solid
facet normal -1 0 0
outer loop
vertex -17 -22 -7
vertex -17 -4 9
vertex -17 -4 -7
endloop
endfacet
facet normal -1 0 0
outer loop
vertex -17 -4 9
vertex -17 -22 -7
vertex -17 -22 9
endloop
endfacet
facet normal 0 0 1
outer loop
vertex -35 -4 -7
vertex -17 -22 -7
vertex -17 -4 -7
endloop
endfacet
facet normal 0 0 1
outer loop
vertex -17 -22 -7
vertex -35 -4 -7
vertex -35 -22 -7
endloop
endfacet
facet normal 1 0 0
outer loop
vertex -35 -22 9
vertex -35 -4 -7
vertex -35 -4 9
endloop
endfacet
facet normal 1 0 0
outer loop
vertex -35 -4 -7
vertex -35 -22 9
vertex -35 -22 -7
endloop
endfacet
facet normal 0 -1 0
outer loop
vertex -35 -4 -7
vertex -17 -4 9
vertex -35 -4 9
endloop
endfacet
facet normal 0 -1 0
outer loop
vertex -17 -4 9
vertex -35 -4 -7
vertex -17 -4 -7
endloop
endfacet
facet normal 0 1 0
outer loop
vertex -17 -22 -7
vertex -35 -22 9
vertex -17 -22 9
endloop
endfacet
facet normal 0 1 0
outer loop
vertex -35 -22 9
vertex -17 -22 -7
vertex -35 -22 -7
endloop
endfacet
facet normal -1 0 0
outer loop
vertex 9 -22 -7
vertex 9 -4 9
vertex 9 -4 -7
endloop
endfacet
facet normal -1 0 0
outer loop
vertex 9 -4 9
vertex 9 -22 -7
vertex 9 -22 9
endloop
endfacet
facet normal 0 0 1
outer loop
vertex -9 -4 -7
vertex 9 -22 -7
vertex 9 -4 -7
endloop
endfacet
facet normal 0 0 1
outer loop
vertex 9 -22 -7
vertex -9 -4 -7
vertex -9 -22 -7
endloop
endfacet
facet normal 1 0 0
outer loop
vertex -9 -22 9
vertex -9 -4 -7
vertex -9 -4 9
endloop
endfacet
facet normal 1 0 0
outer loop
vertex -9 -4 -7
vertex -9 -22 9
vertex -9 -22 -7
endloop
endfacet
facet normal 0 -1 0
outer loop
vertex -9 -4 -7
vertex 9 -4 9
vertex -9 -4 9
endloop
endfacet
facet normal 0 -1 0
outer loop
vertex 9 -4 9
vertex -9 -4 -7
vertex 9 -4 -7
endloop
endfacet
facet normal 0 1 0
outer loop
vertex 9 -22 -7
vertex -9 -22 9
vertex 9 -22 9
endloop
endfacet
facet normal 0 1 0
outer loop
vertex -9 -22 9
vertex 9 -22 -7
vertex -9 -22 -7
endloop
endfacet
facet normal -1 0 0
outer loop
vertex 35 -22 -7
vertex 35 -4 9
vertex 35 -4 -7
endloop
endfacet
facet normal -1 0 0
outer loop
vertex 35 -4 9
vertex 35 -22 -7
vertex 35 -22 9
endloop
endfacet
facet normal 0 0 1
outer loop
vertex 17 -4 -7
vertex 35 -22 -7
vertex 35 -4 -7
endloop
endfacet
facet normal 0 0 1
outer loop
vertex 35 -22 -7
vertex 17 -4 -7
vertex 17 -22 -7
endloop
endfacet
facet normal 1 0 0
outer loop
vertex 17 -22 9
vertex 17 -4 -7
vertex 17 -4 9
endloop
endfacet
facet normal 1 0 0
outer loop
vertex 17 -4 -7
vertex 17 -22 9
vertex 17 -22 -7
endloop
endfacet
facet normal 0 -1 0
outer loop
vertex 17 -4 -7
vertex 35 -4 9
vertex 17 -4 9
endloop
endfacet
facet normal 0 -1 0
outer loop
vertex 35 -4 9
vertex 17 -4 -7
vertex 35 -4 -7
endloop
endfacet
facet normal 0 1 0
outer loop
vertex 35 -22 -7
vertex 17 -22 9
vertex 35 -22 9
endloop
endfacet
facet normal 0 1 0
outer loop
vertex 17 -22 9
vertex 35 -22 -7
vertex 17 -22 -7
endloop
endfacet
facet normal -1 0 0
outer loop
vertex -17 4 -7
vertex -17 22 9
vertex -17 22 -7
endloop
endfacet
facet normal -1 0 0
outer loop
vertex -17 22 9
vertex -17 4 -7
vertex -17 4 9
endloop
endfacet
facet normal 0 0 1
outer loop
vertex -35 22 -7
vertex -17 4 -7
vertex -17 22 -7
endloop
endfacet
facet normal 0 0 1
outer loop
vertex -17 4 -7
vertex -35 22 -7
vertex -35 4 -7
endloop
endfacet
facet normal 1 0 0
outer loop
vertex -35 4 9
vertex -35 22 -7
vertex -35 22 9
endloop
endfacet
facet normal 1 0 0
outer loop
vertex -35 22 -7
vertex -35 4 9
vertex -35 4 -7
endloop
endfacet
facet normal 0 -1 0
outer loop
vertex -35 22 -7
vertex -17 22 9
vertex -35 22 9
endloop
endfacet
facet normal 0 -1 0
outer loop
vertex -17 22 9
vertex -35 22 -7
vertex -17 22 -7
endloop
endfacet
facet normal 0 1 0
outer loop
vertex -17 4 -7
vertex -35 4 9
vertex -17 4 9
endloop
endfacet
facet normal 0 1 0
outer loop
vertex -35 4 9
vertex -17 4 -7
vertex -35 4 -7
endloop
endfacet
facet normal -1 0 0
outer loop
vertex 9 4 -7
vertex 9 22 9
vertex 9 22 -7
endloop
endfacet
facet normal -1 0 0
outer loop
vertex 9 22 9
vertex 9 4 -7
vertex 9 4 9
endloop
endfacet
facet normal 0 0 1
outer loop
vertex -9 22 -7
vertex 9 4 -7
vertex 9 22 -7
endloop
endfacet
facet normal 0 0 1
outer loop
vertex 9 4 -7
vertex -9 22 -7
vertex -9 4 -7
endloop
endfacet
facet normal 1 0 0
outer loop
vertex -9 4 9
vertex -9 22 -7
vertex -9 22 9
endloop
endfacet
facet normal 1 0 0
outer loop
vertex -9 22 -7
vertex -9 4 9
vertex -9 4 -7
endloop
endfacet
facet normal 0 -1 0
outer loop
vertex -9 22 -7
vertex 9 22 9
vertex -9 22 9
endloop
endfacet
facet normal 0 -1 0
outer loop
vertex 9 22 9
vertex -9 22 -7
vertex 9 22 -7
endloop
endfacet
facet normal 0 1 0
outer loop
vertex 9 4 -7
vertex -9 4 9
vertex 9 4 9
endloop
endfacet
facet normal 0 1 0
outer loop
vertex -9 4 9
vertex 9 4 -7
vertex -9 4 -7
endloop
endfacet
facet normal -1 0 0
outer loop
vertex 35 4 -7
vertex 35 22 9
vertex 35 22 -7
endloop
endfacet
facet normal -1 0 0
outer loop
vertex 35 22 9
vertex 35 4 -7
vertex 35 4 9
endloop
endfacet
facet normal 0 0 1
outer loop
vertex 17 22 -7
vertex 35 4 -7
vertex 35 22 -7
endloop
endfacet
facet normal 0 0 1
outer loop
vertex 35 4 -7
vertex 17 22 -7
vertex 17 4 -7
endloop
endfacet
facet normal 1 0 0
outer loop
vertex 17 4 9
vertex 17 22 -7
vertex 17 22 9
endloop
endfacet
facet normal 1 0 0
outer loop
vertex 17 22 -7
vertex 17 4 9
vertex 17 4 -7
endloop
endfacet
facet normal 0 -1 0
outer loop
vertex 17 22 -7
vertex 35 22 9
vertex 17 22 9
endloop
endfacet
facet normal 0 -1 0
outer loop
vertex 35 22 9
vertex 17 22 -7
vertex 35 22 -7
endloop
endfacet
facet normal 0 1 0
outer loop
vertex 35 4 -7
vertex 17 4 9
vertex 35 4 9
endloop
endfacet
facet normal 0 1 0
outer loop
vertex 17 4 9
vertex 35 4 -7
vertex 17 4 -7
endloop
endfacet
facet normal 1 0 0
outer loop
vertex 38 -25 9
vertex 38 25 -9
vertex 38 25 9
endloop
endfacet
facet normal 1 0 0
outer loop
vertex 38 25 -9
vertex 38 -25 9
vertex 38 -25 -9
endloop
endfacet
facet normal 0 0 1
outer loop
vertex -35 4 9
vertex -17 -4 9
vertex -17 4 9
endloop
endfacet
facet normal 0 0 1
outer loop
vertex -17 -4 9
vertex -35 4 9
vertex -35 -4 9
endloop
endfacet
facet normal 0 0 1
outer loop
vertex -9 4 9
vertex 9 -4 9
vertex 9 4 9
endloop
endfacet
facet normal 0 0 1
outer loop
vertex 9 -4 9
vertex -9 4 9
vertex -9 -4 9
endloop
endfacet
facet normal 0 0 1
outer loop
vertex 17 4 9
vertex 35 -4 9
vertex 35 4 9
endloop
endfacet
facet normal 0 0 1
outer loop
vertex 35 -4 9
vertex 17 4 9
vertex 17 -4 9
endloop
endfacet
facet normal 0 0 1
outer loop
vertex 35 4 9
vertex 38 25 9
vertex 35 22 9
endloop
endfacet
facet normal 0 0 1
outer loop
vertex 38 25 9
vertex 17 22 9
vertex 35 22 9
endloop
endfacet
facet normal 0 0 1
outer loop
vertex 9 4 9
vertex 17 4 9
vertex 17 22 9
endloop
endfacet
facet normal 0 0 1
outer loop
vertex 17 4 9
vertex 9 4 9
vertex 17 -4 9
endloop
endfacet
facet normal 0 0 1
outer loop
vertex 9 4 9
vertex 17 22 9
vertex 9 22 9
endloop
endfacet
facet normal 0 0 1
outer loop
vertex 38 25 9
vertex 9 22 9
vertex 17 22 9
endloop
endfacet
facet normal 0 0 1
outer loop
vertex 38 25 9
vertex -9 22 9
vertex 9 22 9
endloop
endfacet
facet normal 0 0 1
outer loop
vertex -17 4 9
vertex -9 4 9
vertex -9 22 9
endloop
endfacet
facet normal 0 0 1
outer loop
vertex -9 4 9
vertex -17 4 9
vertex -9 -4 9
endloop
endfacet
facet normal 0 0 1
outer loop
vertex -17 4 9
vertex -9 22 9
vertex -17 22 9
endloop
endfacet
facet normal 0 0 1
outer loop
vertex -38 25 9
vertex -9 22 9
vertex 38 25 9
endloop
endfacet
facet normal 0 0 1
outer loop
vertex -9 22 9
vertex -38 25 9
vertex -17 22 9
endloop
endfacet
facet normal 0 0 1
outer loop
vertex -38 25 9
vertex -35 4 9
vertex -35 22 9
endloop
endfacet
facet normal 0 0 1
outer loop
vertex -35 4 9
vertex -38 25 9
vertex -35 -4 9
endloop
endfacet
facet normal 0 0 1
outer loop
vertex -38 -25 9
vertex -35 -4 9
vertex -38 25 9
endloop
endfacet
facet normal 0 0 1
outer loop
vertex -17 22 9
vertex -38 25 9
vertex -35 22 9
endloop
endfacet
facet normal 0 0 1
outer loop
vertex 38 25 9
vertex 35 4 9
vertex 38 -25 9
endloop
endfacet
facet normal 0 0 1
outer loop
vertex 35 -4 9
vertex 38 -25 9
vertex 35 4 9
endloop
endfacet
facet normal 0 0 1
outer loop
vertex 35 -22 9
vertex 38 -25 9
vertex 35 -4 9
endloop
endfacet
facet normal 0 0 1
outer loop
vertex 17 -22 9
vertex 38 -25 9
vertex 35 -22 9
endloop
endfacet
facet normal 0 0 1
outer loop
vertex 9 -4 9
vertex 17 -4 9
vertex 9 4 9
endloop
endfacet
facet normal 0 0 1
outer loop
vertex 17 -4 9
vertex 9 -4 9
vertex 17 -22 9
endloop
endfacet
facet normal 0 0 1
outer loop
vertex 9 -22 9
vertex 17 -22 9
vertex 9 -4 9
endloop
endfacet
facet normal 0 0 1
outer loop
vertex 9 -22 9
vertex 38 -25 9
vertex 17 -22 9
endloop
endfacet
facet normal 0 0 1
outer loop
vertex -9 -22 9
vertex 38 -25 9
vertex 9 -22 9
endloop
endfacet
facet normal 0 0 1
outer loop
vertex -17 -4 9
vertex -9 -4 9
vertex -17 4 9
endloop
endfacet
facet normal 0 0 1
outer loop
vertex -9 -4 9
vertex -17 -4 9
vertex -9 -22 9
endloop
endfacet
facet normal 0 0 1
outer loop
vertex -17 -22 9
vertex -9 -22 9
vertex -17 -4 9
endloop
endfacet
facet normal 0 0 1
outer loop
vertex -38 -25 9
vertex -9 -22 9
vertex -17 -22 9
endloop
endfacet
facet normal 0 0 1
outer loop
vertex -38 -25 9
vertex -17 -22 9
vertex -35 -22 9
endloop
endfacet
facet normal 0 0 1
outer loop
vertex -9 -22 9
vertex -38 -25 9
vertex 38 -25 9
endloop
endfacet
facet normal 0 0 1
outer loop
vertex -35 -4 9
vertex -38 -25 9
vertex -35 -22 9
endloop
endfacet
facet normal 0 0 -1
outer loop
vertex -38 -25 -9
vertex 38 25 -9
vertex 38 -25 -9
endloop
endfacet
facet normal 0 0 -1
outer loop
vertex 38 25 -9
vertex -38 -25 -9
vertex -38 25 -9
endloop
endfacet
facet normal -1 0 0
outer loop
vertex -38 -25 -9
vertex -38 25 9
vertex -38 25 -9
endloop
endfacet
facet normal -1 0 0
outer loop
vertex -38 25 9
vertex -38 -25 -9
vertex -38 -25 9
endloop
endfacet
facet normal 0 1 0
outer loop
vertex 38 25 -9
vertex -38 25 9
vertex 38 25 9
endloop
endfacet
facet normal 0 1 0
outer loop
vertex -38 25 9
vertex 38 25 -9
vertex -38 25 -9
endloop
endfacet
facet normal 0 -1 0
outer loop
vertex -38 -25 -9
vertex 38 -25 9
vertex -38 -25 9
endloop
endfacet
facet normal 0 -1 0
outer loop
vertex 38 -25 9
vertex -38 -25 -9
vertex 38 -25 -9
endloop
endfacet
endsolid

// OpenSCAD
$fn = 32;

// ----------------------------------------------------------------------
// Pocket plate 76 x 50 x 18
// 2 x 3 pockets 18 mm square, 16 mm deep
// ----------------------------------------------------------------------

// --- parameters (mm) ---
thickness = 18;  // plate thickness
floor_t = 2;     // material left under each pocket
pocket = 18;     // pocket side length
pitch_x = 26;    // pocket pitch along X
pitch_y = 26;    // pocket pitch along Y
cols = 3;        // pockets per row
rows = 2;        // rows of pockets

// --- derived feature positions (mm) ---
depth = thickness - floor_t;        // = 16   pocket depth, down to the floor
span_x = (cols - 1) * pitch_x;      // = 52   distance between outer pockets
span_y = (rows - 1) * pitch_y;      // = 26   distance between outer pocket rows
origin_x = -span_x / 2;             // = -26   X of the first pocket
origin_y = -span_y / 2;             // = -13   Y of the first pocket
plate = [span_x + pocket + 6, span_y + pocket + 6, thickness];  // = [76, 50, 18]   overall size: pockets plus 3 mm of wall on each side
feature_centers = [
  [origin_x + 0 * pitch_x, origin_y + 0 * pitch_y],
  [origin_x + 1 * pitch_x, origin_y + 0 * pitch_y],
  [origin_x + 2 * pitch_x, origin_y + 0 * pitch_y],
  [origin_x + 0 * pitch_x, origin_y + 1 * pitch_y],
  [origin_x + 1 * pitch_x, origin_y + 1 * pitch_y],
  [origin_x + 2 * pitch_x, origin_y + 1 * pitch_y]
];   // pocket centres, used verbatim by the cutter loop

// plate outline, then one pocket per centre in feature_centers
difference() {
  cube(plate, center = true);
  for (centre = feature_centers)
    translate([centre[0] - pocket / 2, centre[1] - pocket / 2, plate[2] / 2 - depth])
      cube([pocket, pocket, depth + 1]);  // centred on the declared pocket centre
}
